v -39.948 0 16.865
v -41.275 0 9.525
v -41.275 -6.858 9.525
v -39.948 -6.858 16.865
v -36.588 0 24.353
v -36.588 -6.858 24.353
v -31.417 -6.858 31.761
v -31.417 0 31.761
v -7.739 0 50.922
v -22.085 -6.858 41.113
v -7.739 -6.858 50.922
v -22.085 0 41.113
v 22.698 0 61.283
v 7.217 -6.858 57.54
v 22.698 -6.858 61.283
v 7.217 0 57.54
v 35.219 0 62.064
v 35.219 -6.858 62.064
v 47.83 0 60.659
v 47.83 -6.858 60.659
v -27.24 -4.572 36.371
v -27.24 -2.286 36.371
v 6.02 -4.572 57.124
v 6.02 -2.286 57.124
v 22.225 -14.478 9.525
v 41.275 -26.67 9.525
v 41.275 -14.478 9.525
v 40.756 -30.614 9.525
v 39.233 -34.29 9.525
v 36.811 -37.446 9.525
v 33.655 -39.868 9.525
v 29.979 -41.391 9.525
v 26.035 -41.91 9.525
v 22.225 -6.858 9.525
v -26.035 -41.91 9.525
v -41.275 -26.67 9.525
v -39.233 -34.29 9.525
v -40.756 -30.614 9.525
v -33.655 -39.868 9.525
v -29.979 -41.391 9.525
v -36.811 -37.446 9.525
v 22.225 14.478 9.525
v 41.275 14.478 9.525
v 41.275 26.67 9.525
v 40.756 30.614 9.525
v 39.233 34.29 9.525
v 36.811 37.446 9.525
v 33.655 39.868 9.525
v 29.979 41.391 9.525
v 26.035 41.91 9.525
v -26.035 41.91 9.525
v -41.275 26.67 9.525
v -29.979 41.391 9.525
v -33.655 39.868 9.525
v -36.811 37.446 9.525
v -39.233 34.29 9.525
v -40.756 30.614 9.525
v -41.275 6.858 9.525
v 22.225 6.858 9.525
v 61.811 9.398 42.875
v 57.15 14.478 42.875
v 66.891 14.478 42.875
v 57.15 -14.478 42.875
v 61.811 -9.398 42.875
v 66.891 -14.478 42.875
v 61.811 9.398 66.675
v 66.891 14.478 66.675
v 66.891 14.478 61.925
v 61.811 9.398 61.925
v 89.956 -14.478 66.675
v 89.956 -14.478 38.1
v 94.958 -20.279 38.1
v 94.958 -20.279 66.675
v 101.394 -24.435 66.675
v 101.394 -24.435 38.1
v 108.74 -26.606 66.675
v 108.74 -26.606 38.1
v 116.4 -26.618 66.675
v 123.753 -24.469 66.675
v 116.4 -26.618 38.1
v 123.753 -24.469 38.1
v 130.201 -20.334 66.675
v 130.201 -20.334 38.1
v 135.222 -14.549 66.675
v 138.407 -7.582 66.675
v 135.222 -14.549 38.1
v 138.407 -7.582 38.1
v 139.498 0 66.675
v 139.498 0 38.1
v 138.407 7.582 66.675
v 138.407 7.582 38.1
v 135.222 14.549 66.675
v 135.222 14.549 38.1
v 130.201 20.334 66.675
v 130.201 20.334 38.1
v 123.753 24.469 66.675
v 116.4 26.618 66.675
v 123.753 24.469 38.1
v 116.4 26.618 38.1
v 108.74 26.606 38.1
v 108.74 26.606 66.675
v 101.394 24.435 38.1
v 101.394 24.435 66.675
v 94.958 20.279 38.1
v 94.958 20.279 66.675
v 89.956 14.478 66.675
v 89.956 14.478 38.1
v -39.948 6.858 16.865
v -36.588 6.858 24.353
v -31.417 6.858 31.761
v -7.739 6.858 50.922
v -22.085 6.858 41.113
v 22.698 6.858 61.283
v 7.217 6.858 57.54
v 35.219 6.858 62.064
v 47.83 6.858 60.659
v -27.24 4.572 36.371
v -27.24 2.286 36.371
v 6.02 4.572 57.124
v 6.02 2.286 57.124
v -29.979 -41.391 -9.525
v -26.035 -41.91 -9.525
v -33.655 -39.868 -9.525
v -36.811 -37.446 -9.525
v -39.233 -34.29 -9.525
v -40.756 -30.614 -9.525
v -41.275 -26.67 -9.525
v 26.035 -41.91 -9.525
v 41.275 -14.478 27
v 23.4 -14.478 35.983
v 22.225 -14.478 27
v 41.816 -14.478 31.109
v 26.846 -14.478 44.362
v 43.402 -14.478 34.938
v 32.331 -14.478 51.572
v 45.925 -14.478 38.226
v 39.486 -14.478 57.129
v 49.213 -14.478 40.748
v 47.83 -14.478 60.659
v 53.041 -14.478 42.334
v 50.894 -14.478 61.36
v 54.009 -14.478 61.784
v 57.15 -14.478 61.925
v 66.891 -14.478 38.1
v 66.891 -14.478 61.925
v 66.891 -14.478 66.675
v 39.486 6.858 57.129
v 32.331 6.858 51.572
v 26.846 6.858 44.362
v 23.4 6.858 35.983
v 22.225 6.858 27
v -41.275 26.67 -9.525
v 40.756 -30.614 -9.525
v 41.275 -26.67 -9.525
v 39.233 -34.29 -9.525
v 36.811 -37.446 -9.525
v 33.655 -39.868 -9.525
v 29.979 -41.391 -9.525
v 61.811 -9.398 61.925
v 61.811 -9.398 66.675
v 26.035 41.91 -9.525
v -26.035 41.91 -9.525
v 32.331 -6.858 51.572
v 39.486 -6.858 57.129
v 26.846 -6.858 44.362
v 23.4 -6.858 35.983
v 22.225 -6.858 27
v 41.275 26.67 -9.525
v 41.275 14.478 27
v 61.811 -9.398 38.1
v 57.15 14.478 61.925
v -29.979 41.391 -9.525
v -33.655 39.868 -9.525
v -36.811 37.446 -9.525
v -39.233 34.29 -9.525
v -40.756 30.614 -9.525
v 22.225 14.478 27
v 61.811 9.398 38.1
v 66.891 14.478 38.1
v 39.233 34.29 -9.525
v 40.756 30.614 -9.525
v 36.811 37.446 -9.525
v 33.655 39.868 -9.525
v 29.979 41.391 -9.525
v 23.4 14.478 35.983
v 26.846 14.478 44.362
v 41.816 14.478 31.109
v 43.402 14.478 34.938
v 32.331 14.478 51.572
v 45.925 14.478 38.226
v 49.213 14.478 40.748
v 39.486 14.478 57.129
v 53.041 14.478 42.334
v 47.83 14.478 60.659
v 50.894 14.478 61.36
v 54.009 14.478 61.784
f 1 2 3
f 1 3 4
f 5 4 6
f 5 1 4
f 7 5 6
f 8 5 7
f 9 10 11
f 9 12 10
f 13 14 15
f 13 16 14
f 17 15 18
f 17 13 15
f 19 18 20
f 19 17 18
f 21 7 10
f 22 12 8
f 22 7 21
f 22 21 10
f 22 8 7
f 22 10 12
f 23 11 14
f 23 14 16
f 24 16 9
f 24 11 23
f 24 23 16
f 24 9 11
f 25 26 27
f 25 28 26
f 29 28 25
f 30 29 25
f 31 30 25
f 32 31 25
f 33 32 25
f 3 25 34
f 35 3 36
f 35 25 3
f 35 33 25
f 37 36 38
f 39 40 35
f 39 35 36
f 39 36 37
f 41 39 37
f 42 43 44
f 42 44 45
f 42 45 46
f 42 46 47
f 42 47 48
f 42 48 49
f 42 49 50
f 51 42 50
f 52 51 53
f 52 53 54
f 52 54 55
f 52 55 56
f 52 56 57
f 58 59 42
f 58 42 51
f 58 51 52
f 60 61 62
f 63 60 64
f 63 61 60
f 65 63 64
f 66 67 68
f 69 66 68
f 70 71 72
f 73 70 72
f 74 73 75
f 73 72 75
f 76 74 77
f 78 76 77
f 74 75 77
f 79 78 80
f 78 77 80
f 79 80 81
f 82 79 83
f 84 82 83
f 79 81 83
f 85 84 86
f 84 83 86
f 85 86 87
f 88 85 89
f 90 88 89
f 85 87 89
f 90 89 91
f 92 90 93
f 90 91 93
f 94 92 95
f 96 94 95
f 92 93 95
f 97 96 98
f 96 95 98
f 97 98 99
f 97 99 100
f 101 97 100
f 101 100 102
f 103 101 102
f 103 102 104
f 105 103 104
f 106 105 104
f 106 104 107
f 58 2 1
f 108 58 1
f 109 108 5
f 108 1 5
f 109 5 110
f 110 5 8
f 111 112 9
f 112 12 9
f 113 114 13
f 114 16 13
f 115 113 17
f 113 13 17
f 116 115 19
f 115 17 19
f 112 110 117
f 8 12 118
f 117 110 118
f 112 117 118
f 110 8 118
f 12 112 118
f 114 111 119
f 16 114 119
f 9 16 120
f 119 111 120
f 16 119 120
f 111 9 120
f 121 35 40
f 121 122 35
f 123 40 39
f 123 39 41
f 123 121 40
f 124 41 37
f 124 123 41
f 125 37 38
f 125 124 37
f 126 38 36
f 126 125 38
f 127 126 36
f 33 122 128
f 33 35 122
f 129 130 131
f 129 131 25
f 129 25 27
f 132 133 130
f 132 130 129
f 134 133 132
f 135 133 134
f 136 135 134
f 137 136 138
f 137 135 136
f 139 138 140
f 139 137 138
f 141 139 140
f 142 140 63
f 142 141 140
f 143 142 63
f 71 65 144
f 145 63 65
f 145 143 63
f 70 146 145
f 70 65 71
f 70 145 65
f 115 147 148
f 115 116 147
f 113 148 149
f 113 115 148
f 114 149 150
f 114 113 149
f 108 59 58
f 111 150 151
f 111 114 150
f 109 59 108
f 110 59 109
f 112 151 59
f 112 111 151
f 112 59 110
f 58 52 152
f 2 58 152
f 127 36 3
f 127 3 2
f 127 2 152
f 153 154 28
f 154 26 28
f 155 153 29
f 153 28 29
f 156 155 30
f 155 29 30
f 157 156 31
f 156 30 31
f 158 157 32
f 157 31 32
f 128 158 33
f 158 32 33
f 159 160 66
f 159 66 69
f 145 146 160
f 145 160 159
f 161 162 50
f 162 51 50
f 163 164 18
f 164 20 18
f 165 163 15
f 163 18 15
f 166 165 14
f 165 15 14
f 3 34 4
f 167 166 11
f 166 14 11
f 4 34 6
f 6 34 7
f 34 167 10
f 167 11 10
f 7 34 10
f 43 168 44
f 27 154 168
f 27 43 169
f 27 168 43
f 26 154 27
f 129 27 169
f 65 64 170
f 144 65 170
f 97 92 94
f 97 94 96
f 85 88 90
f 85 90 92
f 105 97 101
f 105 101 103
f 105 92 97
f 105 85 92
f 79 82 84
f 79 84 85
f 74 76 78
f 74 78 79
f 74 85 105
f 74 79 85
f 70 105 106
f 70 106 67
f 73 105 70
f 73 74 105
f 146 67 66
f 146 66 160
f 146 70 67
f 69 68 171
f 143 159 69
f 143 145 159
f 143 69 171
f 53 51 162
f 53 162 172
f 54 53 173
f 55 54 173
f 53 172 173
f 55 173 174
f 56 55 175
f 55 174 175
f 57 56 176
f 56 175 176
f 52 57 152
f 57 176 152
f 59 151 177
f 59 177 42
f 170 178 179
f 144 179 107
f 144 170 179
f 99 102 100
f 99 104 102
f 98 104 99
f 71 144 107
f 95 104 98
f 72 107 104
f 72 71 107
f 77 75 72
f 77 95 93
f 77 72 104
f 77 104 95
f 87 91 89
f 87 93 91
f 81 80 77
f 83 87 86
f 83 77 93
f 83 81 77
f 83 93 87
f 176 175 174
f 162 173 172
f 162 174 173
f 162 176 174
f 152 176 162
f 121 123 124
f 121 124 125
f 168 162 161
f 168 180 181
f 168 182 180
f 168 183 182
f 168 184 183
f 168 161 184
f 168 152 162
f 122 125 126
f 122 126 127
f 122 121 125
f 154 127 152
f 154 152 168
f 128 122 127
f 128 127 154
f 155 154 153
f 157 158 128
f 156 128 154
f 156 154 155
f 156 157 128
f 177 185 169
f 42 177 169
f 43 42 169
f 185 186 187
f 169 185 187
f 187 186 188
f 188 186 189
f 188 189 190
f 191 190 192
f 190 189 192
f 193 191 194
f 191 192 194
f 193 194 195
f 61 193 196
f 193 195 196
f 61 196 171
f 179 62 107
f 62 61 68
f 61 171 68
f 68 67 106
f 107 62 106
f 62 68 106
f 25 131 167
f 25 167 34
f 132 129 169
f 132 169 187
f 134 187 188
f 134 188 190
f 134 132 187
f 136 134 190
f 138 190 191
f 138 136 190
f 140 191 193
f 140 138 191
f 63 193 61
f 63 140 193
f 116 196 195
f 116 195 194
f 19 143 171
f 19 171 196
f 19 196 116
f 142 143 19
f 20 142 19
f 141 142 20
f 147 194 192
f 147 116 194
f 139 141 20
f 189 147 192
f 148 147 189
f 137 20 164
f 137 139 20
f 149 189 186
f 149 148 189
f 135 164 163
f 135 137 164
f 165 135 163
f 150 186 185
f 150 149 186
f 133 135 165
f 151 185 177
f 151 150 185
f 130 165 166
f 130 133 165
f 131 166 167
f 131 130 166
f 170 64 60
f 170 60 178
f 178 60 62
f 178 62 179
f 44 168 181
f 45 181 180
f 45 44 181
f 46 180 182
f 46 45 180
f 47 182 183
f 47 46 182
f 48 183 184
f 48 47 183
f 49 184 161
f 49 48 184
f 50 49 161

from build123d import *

# Parameters (mm, degrees)
F1_DEPTH = 41.91
F0_W     = 23.9135493911
F0_H     = 19.0500000095
F0_H_2   = 4.7497999905
F0_H_3   = 4.7752
F2_DEPTH = 14.478
F3_DEPTH = 6.858
F5_R     = 15.24
F6_SIZE  = 5.08


with BuildPart() as f1:
    # F0 (on Front) → F1 (new body, symmetric)
    with BuildSketch(Plane.XZ):
        Polygon((22.2249999905, 9.525), (-41.275, 9.525), (-41.275, -9.525), (41.275, -9.525), (41.275, 9.525), align=None)
    extrude(amount=F1_DEPTH, both=True)

    # F0 (on Front) → F2 (join, symmetric)
    with BuildSketch(Plane.XZ):
        with Locations((73.7682253044, 52.4002000047)):
            Rectangle(F0_W, F0_H)
        Polygon((85.725, 66.675), (85.725, 61.9252000095), (85.725, 42.8752), (85.725, 38.1), (112.6114506089, 38.1), (112.6114506089, 66.675), align=None)
        with Locations((73.7682253044, 64.3001000047)):
            Rectangle(F0_W, F0_H_2)
        with Locations((73.7682253044, 40.4876)):
            Rectangle(F0_W, F0_H_3)
        with BuildLine():
            Line((22.2249999905, 27.0002), (22.2249999905, 9.525))
            Line((22.2249999905, 9.525), (41.275, 9.525))
            Line((41.275, 9.525), (41.275, 27.0002))
            ThreePointArc((41.275, 27.0002), (45.9246798487, 38.2255201513), (57.15, 42.8752))
            Line((57.15, 42.8752), (61.8114506089, 42.8752))
            Line((61.8114506089, 42.8752), (61.8114506089, 61.9252000095))
            Line((61.8114506089, 61.9252000095), (57.15, 61.9252000095))
            ThreePointArc((57.15, 61.9252000095), (52.4471910202, 61.6071243557), (47.8300426869, 60.6586910735))
            ThreePointArc((47.8300426869, 60.6586910735), (29.3538209918, 48.1456027677), (22.2249999905, 27.0002))
        make_face()
    extrude(amount=F2_DEPTH, both=True)

    # F0 (on Front) → F3 (join, symmetric)
    with BuildSketch(Plane.XZ):
        with BuildLine():
            add(Edge.make_bspline(
                [(-41.275, 9.525), (-40.409822017, 35.7104353607), (5.303404294, 69.4405809045), (47.8300426869, 60.6586910735)],
                knots=[0, 0, 0, 0, 102.734429453, 102.734429453, 102.734429453, 102.734429453], degree=3))
            Line((-41.275, 9.525), (22.2249999905, 9.525))
            Line((22.2249999905, 9.525), (22.2249999905, 27.0002))
            ThreePointArc((22.2249999905, 27.0002), (29.3538209918, 48.1456027677), (47.8300426869, 60.6586910735))
        make_face()
    extrude(amount=F3_DEPTH, both=True)

    # F0 (on Front) → F4 (revolve)
    with BuildSketch(Plane.XZ):
        Polygon((85.725, 66.675), (85.725, 61.9252000095), (85.725, 42.8752), (85.725, 38.1), (112.6114506089, 38.1), (112.6114506089, 66.675), align=None)
    revolve(axis=Axis((112.6114506089, 0, 52.3875), (0, 0, 1)))

    # F5
    f5_edges = [f1.edges().sort_by_distance(p)[0] for p in [
        (-41.275, -41.91, 0),
        (41.275, -41.91, 0),
        (41.275, 41.91, 0),
        (-41.275, 41.91, 0),
    ]]
    fillet(f5_edges, radius=F5_R)

    # F6
    f6_edges = [f1.edges().sort_by_distance(p)[0] for p in [
        (61.811451, -14.478, 64.3001),
        (61.811451, -14.478, 40.4876),
        (61.811451, 14.478, 64.3001),
        (61.811451, 14.478, 40.4876),
    ]]
    chamfer(f6_edges, length=F6_SIZE)


solid = f1.part
